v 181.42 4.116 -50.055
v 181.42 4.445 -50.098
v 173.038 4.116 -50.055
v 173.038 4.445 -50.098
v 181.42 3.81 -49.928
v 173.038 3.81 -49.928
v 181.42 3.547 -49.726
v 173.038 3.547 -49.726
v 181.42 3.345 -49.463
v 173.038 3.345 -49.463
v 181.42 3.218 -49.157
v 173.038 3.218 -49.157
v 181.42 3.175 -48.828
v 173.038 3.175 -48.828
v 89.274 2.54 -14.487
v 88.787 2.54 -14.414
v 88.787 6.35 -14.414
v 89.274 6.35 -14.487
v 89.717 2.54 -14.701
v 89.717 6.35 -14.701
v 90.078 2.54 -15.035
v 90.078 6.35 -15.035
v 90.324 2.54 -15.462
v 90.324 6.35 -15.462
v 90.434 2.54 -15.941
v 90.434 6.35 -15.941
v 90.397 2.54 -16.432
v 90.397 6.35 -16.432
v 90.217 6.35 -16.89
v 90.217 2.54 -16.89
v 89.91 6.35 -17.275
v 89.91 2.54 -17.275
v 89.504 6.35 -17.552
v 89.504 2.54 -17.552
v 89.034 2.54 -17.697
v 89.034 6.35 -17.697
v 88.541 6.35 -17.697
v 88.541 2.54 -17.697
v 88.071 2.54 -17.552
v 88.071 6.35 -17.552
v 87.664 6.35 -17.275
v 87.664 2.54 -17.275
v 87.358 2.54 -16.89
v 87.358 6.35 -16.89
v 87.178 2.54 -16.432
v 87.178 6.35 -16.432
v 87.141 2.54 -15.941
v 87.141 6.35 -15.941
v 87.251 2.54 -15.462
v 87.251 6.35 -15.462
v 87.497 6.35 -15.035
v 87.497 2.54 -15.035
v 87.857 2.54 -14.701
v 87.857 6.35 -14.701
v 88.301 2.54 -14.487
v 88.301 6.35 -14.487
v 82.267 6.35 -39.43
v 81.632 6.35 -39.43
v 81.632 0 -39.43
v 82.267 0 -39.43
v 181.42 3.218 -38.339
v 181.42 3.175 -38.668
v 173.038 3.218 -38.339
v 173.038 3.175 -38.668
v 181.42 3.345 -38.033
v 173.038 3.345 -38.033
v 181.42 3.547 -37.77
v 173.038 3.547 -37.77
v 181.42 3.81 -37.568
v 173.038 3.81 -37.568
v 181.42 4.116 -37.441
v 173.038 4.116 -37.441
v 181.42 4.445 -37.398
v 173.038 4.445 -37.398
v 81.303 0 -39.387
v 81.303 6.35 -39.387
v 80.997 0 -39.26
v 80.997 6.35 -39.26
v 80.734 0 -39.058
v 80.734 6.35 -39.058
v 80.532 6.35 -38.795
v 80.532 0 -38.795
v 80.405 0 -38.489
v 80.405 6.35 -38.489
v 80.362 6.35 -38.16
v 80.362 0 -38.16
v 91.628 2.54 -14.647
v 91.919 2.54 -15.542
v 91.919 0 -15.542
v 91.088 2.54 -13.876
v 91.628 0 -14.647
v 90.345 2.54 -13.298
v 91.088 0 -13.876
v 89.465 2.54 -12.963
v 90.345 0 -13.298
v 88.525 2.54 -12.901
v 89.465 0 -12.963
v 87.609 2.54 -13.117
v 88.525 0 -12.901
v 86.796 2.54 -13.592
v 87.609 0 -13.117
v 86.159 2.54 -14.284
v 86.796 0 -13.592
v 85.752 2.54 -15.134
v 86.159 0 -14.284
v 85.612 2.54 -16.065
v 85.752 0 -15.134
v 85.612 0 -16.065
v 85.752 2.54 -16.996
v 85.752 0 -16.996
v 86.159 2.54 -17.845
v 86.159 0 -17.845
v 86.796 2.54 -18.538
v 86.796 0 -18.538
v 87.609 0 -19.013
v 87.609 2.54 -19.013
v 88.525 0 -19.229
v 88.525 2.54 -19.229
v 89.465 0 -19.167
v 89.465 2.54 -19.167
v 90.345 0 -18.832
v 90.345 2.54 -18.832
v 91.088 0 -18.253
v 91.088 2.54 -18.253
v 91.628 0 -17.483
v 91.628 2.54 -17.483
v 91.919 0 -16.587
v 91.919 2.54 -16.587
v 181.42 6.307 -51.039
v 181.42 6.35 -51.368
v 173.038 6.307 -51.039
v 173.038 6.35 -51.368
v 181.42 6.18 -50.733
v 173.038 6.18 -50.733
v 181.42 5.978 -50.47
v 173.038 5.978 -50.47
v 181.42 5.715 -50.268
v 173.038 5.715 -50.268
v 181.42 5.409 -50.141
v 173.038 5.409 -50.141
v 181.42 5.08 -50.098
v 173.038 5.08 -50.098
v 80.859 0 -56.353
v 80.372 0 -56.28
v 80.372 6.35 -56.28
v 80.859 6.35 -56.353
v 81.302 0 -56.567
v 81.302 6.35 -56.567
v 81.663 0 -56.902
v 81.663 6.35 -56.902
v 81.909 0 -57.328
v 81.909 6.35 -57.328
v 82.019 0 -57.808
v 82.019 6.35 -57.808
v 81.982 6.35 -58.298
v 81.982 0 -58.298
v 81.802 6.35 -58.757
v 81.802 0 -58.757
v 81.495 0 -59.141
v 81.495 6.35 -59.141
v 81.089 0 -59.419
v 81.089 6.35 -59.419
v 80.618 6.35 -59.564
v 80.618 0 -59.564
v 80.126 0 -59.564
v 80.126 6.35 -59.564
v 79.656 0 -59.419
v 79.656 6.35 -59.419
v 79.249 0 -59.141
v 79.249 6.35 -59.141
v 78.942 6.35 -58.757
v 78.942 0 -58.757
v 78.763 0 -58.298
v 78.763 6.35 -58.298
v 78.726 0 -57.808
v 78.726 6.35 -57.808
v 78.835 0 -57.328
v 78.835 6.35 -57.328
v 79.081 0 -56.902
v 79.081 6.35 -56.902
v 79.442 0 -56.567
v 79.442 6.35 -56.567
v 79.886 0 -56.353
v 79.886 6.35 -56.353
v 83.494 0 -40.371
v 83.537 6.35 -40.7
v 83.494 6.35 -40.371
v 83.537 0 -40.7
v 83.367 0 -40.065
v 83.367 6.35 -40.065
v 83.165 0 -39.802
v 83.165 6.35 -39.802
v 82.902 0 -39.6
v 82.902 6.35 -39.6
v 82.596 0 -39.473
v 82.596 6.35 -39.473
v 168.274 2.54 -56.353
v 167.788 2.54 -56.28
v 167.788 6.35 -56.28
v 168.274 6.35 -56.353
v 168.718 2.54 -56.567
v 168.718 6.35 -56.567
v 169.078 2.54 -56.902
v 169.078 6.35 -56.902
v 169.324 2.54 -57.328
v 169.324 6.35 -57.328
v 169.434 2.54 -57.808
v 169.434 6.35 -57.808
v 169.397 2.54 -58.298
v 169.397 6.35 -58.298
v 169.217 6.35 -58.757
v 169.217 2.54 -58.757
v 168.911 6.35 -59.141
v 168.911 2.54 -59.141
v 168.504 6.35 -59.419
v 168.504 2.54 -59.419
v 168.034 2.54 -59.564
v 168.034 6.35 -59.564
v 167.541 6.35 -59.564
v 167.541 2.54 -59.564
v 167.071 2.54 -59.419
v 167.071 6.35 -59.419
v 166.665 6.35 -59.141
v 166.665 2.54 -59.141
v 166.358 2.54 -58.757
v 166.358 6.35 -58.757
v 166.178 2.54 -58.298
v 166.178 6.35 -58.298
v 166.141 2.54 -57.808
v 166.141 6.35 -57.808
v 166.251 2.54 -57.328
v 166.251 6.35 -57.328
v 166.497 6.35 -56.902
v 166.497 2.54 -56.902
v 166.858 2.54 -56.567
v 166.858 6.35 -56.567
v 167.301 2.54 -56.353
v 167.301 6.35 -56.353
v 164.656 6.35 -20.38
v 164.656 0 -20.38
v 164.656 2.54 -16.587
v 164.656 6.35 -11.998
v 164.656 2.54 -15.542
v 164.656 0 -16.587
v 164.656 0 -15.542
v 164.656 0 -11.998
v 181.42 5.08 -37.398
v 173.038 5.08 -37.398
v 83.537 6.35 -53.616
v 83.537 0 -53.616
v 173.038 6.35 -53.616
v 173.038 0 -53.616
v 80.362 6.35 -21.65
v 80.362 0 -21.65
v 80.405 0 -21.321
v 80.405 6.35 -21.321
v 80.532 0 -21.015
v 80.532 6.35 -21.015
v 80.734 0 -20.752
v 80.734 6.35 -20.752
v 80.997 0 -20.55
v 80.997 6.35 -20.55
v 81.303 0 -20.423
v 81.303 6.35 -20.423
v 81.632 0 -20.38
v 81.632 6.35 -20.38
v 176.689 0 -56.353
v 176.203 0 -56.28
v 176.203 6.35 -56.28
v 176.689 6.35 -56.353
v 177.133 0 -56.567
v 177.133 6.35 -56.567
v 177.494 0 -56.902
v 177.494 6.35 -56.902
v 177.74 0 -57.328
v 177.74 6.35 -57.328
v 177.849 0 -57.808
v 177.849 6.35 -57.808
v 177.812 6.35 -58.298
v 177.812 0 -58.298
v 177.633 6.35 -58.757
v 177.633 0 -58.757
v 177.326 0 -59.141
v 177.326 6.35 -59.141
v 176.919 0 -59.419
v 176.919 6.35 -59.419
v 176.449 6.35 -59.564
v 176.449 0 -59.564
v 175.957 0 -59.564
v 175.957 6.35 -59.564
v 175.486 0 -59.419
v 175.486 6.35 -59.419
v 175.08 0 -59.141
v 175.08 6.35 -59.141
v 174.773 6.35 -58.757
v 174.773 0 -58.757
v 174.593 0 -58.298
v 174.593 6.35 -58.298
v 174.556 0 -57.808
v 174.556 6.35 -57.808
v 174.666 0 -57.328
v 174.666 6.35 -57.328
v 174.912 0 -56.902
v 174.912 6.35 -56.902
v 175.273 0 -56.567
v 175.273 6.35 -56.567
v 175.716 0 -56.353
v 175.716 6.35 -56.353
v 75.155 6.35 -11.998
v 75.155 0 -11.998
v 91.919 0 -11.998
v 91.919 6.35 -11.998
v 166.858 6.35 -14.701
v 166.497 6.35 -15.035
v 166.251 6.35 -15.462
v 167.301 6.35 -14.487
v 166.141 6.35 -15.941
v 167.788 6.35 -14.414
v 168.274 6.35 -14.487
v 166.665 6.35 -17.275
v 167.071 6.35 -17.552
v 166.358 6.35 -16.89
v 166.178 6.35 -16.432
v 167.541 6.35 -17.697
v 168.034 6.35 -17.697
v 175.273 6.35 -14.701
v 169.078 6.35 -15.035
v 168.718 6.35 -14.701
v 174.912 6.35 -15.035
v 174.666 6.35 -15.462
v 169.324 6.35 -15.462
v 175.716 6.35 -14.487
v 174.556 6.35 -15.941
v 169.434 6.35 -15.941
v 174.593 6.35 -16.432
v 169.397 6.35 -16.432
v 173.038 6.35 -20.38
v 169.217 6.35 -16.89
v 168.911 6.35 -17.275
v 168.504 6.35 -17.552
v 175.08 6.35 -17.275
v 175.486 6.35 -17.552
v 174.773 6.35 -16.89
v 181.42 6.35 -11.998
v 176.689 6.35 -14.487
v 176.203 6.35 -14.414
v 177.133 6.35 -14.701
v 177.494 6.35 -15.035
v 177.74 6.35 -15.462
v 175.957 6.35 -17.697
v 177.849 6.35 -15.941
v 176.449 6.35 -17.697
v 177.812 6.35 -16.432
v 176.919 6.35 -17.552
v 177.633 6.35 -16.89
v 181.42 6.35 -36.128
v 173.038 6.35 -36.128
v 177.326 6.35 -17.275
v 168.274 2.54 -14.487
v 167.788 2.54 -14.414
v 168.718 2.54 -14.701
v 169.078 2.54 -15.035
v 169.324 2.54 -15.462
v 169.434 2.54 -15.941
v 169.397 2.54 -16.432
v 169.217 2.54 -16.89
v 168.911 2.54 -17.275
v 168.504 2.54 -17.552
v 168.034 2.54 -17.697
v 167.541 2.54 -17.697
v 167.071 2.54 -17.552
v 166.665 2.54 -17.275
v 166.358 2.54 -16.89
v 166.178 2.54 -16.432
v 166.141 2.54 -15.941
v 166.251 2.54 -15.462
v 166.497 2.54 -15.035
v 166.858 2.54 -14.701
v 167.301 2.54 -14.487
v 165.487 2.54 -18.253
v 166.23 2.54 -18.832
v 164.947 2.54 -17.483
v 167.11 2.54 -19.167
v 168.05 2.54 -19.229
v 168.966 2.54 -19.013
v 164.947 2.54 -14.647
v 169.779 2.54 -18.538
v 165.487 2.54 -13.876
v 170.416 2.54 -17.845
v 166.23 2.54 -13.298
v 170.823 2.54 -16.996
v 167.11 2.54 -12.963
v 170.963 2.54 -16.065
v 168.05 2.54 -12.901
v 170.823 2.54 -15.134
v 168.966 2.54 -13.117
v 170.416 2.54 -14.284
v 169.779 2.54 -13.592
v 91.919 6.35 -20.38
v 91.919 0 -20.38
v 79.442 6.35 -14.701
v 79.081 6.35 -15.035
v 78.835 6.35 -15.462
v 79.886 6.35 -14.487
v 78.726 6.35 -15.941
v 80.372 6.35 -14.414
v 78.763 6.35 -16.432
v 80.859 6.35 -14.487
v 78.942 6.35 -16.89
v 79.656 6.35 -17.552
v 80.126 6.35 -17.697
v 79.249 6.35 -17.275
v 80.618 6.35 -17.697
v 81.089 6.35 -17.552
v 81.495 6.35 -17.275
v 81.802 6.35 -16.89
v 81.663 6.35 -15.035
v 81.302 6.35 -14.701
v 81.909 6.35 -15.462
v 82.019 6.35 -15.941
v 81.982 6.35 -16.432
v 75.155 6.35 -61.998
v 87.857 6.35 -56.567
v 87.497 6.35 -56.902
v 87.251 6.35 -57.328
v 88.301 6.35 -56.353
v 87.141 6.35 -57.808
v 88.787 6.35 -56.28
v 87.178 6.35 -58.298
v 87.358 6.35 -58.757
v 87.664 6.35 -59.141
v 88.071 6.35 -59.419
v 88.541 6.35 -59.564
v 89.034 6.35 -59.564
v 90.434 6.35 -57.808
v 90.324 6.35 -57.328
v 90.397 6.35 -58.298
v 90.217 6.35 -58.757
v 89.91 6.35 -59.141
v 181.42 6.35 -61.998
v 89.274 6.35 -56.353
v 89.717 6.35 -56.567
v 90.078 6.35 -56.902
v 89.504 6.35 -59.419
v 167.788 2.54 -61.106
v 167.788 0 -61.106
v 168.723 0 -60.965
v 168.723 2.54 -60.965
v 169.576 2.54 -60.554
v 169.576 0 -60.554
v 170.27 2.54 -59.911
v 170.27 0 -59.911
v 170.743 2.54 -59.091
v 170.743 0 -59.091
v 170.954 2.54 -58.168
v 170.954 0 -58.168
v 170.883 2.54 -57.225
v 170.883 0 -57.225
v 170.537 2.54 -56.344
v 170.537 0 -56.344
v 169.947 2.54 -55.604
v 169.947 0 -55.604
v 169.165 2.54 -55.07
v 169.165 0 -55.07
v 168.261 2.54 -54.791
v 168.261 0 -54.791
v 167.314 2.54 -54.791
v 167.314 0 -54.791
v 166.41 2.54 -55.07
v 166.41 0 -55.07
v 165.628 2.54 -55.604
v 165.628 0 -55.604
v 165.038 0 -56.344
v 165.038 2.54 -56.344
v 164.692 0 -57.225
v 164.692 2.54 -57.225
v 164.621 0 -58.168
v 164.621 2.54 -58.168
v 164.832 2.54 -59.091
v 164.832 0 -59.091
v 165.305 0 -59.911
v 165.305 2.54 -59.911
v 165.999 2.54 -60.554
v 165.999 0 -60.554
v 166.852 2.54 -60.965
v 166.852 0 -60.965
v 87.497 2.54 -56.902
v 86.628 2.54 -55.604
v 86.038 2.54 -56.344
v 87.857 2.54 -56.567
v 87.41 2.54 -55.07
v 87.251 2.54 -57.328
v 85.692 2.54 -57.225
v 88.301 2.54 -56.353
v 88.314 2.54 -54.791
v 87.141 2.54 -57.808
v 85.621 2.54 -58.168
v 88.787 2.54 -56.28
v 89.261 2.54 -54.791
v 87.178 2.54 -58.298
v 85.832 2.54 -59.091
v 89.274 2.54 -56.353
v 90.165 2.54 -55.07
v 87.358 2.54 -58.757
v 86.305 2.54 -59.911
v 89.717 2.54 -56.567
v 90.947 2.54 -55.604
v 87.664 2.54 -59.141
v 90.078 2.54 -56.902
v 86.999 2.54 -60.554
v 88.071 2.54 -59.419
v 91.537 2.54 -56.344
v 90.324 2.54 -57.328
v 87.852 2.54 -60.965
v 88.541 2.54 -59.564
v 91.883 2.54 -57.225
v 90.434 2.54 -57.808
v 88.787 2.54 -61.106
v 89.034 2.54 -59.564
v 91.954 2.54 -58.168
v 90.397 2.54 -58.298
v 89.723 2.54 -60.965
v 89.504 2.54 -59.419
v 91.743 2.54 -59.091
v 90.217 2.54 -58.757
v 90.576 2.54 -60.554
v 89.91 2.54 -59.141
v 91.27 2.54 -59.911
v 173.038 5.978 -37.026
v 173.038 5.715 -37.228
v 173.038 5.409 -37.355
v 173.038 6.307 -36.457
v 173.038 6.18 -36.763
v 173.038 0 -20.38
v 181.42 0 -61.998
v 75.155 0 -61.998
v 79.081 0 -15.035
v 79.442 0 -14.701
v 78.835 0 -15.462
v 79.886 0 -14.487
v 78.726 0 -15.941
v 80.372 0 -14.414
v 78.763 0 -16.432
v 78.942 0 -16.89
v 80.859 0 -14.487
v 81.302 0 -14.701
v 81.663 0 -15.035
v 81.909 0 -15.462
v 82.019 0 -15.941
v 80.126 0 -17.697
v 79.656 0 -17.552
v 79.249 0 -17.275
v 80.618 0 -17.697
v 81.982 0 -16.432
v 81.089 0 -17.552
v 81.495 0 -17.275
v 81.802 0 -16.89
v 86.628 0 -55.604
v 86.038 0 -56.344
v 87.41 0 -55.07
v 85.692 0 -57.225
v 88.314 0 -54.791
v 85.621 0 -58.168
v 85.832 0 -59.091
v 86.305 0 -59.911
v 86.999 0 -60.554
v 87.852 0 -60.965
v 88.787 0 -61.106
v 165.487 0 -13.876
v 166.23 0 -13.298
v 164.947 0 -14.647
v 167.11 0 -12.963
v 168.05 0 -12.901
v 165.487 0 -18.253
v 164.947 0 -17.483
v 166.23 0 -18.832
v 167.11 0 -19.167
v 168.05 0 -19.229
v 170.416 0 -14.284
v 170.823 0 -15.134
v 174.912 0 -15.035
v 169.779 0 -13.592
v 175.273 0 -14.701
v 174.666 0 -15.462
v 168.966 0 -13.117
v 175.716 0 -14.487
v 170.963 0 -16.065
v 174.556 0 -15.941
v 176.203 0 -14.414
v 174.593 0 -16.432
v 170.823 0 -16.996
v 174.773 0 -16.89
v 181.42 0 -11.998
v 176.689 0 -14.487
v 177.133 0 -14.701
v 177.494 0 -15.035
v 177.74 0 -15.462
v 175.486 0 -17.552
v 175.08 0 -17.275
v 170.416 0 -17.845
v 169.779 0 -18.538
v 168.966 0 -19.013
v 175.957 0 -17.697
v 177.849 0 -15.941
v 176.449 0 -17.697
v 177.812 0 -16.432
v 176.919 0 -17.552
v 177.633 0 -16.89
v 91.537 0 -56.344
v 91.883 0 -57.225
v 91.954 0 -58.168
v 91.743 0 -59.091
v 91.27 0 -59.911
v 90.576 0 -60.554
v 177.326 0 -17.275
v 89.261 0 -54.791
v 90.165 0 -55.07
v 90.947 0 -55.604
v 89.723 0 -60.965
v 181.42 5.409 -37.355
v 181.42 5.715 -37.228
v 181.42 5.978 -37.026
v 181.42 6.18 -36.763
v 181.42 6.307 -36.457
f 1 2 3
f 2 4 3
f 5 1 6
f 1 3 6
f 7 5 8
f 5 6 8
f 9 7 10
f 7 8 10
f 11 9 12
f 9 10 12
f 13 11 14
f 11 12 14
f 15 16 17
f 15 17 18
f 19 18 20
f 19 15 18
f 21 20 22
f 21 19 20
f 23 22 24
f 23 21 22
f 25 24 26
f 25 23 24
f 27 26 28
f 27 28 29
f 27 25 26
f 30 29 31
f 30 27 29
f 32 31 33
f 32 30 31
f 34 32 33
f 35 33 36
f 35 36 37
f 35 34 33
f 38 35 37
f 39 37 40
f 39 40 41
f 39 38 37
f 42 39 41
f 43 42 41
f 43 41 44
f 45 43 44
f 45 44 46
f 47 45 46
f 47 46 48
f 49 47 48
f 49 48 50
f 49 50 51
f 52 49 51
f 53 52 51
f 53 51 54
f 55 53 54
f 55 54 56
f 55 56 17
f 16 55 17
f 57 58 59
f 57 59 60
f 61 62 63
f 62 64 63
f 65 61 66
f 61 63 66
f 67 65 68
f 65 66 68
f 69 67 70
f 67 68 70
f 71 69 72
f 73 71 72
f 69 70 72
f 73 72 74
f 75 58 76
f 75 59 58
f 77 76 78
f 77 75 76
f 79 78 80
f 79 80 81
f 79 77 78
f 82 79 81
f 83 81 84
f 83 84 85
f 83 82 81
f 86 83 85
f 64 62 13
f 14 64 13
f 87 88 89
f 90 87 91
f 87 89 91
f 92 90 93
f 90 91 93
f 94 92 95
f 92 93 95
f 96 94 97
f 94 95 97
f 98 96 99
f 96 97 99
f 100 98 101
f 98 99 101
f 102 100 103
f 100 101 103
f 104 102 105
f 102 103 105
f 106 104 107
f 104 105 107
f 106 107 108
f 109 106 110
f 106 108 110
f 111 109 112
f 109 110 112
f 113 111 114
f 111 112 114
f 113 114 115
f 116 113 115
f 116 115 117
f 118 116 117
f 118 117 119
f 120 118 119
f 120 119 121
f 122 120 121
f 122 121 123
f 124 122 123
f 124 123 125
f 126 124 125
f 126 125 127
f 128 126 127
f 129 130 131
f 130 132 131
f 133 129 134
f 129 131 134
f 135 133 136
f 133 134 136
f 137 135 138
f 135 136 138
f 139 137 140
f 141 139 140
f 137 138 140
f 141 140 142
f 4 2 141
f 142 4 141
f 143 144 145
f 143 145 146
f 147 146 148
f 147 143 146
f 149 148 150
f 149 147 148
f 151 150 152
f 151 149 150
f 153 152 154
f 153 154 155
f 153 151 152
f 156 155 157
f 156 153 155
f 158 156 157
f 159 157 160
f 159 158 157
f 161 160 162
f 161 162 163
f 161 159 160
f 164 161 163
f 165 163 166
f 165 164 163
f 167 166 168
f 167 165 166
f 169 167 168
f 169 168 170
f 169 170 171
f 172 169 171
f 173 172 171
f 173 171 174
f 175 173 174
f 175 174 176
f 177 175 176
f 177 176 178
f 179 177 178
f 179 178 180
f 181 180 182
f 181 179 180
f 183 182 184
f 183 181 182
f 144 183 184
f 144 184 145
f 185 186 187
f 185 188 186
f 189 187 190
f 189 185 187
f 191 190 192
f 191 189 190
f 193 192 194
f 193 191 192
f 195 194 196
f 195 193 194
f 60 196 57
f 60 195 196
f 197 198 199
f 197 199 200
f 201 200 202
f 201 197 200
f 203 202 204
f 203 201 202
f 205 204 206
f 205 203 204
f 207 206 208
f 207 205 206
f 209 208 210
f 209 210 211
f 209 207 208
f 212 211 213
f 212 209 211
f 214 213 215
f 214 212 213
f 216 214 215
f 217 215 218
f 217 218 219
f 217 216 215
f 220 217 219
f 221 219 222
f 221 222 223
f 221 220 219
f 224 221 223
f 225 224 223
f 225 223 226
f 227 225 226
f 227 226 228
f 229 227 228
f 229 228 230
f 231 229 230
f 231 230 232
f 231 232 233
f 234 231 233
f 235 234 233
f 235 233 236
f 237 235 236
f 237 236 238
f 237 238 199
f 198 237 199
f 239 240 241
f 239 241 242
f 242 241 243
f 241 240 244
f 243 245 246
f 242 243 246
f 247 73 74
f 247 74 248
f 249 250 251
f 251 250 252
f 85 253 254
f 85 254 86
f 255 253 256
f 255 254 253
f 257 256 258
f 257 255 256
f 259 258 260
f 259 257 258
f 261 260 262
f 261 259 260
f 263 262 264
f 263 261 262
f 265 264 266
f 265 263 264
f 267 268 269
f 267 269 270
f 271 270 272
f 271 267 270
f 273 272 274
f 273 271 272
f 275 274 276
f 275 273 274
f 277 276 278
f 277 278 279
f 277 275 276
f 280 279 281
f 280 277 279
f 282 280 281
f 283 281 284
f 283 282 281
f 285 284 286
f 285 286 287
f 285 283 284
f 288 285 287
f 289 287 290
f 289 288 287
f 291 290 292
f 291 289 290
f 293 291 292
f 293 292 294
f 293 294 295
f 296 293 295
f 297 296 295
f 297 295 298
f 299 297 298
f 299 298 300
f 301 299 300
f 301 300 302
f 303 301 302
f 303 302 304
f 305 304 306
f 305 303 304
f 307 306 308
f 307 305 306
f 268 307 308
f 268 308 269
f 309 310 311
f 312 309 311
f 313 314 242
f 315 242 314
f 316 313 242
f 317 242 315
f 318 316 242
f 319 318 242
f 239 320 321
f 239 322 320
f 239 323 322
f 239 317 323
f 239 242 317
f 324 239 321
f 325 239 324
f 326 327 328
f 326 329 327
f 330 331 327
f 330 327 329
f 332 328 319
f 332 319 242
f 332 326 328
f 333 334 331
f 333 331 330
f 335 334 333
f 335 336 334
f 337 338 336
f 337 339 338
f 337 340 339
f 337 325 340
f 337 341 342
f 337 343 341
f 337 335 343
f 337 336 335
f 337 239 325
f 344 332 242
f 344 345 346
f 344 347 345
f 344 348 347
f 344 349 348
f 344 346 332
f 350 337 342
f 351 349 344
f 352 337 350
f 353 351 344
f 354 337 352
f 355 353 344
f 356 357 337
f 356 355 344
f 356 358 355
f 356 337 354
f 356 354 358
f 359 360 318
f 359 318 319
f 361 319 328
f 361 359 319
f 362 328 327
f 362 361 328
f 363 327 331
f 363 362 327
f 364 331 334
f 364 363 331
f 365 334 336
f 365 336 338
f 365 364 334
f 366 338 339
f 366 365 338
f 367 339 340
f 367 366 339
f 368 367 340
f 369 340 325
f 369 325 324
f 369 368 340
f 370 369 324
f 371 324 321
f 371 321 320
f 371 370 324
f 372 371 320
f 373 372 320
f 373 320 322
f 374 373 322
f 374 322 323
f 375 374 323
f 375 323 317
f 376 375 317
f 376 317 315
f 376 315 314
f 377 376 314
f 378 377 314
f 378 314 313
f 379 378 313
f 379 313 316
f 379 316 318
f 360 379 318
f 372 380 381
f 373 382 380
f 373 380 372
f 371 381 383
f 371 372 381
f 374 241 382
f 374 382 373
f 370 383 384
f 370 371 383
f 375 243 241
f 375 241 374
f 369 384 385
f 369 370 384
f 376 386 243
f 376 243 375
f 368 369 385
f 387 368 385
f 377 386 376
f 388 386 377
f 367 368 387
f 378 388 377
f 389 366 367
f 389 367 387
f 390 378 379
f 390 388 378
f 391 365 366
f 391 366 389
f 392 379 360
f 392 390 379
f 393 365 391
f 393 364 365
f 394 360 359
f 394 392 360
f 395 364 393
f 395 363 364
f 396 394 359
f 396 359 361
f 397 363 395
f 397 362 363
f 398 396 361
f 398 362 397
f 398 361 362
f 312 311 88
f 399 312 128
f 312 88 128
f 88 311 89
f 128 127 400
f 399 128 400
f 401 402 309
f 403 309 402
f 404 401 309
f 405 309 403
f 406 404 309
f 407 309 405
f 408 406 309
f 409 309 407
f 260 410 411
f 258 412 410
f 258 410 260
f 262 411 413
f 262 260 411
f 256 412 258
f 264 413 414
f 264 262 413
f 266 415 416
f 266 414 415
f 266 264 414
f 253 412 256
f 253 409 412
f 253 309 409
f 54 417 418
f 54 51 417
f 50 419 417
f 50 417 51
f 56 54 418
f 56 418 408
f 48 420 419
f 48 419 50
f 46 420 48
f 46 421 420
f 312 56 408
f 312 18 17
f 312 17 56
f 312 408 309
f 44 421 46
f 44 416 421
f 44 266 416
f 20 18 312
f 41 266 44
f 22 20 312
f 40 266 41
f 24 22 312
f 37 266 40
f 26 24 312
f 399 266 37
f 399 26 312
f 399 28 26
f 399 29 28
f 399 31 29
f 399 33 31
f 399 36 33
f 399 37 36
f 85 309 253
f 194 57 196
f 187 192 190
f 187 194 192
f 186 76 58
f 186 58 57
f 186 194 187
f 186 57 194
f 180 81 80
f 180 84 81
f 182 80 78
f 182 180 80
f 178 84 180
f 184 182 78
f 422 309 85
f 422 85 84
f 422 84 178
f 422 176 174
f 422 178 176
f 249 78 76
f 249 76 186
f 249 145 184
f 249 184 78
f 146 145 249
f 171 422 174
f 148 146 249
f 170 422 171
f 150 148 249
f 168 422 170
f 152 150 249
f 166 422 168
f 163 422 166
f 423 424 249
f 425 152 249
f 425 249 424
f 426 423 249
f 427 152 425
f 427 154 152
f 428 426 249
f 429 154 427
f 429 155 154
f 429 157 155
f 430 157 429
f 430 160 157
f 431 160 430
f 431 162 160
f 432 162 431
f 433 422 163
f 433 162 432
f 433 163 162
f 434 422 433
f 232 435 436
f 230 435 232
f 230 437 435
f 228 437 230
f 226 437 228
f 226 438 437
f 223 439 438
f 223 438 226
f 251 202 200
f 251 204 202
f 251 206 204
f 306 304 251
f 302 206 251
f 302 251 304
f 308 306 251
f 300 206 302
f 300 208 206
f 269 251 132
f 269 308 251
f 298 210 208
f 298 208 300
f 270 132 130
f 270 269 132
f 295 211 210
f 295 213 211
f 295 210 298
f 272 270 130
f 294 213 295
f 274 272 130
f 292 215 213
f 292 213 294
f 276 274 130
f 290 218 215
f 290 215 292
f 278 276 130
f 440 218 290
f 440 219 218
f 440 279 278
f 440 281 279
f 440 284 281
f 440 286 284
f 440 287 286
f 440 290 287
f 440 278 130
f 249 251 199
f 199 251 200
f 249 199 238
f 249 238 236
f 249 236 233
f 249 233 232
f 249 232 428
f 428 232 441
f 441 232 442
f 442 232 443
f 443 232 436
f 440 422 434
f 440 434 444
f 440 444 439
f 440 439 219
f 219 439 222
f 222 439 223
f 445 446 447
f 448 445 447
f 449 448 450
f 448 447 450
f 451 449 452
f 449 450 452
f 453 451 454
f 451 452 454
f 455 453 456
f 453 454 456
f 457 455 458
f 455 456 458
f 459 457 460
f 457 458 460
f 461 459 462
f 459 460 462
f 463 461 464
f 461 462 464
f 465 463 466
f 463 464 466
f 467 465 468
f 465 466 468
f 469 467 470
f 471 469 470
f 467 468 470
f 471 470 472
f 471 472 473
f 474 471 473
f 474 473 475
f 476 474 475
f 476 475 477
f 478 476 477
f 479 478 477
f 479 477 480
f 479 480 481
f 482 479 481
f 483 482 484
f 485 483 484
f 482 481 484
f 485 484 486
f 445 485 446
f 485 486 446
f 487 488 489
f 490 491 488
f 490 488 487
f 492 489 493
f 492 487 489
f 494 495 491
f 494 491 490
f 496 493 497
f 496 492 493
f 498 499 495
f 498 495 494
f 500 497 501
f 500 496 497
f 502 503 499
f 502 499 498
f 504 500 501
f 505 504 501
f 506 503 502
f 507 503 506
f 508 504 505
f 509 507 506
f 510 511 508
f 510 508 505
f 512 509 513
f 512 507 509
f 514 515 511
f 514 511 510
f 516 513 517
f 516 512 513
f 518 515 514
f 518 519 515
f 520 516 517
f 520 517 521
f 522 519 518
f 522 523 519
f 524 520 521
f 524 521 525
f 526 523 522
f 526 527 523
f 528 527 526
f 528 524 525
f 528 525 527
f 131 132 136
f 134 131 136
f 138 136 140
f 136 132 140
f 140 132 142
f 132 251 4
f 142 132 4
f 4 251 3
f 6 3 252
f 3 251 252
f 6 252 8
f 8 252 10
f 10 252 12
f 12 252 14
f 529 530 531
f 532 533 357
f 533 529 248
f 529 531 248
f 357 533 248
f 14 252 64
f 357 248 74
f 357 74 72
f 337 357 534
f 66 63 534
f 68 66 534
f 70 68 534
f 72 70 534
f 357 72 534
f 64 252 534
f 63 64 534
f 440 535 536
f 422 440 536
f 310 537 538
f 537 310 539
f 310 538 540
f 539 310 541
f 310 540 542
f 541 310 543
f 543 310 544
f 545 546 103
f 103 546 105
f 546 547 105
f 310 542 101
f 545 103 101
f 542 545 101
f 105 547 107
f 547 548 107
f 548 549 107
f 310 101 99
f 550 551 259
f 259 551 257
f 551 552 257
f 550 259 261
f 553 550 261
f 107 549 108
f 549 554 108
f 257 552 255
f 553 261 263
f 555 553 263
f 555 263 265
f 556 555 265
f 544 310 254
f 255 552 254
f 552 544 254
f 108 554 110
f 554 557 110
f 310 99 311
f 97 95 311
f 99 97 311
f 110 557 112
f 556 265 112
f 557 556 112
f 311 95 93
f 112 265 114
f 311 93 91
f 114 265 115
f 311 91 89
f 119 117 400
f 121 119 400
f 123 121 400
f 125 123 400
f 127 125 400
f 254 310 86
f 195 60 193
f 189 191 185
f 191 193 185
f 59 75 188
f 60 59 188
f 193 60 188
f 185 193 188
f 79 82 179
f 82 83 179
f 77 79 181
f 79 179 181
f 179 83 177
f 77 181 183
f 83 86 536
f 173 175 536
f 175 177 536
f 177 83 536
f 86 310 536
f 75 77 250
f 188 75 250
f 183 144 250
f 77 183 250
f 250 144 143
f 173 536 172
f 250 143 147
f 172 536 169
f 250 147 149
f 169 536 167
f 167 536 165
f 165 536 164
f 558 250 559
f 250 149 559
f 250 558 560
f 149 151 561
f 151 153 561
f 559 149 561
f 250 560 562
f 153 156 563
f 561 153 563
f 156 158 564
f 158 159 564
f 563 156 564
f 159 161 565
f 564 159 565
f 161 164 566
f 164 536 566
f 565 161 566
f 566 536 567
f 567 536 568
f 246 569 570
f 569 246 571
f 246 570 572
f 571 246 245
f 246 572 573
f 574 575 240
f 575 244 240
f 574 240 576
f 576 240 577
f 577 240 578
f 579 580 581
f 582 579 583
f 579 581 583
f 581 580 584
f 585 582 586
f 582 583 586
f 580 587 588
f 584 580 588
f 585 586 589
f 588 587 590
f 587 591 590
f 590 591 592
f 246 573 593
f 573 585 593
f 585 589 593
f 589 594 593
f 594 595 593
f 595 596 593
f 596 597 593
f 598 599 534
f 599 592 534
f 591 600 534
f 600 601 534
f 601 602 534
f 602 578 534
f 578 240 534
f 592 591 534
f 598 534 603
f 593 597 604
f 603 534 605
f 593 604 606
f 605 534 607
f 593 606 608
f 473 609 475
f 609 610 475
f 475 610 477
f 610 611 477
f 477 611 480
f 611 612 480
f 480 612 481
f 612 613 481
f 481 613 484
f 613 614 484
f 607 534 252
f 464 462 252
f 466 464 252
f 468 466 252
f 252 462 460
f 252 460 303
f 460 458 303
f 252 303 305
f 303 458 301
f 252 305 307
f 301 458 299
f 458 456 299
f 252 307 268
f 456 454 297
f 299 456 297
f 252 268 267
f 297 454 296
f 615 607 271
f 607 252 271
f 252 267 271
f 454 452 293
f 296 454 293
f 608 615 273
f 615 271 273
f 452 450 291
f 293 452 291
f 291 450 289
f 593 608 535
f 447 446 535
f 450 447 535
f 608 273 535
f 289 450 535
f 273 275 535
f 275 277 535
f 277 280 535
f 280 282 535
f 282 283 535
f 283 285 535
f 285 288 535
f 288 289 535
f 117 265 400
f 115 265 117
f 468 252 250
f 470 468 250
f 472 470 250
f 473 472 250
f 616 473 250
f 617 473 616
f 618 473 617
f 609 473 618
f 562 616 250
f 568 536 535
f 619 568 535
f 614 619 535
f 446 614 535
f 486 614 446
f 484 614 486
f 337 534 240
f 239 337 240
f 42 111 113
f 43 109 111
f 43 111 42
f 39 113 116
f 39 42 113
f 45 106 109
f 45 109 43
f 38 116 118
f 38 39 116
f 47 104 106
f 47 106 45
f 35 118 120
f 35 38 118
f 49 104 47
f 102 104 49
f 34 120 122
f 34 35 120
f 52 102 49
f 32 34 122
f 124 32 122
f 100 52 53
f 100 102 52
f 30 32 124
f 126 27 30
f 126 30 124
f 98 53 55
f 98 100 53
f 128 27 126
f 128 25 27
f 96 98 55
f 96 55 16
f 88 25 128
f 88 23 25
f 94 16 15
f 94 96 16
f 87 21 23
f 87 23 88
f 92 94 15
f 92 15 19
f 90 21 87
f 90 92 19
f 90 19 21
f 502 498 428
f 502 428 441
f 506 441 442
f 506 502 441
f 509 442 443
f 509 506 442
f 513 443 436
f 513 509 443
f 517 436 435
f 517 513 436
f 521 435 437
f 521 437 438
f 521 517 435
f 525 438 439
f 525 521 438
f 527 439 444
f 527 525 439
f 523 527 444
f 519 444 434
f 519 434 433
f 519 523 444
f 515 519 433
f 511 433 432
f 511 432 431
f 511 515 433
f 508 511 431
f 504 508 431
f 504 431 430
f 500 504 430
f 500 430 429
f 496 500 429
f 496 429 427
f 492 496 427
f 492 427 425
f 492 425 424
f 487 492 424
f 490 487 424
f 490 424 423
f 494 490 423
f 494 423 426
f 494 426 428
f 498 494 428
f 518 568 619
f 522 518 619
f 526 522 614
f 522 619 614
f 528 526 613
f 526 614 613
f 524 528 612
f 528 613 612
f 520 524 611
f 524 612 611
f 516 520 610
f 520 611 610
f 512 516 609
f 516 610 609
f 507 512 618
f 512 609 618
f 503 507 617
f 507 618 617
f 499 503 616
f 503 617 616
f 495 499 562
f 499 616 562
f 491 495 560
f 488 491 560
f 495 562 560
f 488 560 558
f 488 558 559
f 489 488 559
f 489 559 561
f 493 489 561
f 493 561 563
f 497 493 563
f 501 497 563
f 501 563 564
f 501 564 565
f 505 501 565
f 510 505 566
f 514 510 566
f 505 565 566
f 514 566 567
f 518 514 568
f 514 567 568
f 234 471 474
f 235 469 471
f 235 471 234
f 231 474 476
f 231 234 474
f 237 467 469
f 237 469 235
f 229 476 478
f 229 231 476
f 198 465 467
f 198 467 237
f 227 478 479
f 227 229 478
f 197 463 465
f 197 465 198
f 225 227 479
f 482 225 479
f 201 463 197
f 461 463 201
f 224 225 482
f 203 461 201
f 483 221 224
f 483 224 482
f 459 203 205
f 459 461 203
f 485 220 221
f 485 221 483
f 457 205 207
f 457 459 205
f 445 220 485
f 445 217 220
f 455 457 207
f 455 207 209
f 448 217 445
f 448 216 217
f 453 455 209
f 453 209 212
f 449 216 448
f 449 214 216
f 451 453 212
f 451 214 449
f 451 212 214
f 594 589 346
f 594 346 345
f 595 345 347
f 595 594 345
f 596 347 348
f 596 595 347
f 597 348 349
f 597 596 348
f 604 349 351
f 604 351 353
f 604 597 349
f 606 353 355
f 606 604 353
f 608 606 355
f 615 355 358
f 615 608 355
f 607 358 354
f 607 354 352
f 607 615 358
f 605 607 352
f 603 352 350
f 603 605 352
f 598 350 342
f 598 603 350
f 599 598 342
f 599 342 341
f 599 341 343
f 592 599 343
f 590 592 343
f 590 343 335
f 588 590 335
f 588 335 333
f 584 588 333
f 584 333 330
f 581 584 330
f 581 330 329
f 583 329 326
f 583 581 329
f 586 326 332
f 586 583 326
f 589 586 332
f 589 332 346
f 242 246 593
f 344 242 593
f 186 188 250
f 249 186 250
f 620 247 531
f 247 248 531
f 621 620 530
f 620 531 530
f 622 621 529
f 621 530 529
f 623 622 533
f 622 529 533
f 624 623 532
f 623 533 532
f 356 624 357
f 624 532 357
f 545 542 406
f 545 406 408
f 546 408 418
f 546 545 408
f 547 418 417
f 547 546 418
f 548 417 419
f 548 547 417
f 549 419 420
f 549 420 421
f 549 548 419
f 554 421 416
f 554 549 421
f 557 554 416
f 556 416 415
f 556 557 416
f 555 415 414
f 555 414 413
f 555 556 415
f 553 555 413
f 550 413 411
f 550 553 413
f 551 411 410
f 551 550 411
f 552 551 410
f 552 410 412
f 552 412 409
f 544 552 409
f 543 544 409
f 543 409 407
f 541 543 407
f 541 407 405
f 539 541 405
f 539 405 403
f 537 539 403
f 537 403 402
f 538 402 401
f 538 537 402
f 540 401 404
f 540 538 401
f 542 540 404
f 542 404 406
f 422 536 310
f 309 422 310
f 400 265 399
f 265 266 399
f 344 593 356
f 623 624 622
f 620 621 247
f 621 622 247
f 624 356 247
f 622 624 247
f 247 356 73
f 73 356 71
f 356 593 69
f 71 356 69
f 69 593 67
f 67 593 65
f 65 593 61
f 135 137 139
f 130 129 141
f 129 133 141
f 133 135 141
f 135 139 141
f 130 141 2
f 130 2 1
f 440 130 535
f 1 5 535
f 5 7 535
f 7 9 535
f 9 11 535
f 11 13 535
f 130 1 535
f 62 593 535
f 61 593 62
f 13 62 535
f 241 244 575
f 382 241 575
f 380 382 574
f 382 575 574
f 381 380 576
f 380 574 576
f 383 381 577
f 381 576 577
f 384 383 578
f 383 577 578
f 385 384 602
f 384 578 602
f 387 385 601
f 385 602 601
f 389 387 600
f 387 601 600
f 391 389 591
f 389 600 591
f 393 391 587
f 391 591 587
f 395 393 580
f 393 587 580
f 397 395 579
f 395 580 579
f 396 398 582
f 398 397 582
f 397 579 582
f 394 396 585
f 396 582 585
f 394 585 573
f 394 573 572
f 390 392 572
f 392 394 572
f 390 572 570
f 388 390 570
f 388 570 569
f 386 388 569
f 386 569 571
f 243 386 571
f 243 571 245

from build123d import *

# Parameters (mm, degrees)
SKETCH1_R           = 1.651
BOSS_EXTRUDE1_DEPTH = 6.35
SKETCH2_W           = 12.7
SKETCH2_H           = 3.175
CUT_EXTRUDE7_DEPTH  = 8.89
FILLET2_R           = 1.27
SKETCH4_W           = 3.175
SKETCH4_H           = 19.05
CUT_EXTRUDE8_DEPTH  = 192.82600491
FILLET3_R           = 1.27
SKETCH5_R           = 3.175
CUT_EXTRUDE9_DEPTH  = 2.54


with BuildPart() as part:
    # Sketch1 → Boss-Extrude1 (new body)
    with BuildSketch(Plane(origin=(0, 0, 0), x_dir=(1, 0, 0), z_dir=(0, 1, 0))):
        Polygon((75.155177047, 61.997896552), (75.155177047, 11.997896552), (91.919177047, 11.997896552), (91.919177047, 20.379896552), (83.537177047, 20.379896552), (83.537177047, 53.615896552), (173.037829354, 53.615896552), (173.037829354, 20.379896552), (164.655829354, 20.379896552), (164.655829354, 11.997896552), (181.419829354, 11.997896552), (181.419829354, 61.997896552), align=None)
        with Locations(Location((80.3721812, 16.064784874, 0), (0, 0, 270))):
            Circle(SKETCH1_R, mode=Mode.SUBTRACT)
        with Locations(Location((80.3721812, 57.93100823, 0), (0, 0, 270))):
            Circle(SKETCH1_R, mode=Mode.SUBTRACT)
        with Locations(Location((88.7874552, 16.064784874, 0), (0, 0, 270))):
            Circle(SKETCH1_R, mode=Mode.SUBTRACT)
        with Locations(Location((167.7875512, 57.93100823, 0), (0, 0, 270))):
            Circle(SKETCH1_R, mode=Mode.SUBTRACT)
        with Locations(Location((88.7874552, 57.93100823, 0), (0, 0, 270))):
            Circle(SKETCH1_R, mode=Mode.SUBTRACT)
        with Locations(Location((176.2028252, 57.93100823, 0), (0, 0, 270))):
            Circle(SKETCH1_R, mode=Mode.SUBTRACT)
        with Locations(Location((176.2028252, 16.064784874, 0), (0, 0, 270))):
            Circle(SKETCH1_R, mode=Mode.SUBTRACT)
        with Locations(Location((167.7875512, 16.064784874, 0), (0, 0, 270))):
            Circle(SKETCH1_R, mode=Mode.SUBTRACT)
    extrude(amount=BOSS_EXTRUDE1_DEPTH)

    # Sketch2 → Cut-Extrude7 (cut)
    with BuildSketch(Plane(origin=(181.419829354, 0, 0), x_dir=(0, 0, -1), z_dir=(1, 0, 0))):
        with Locations((43.747896552, 4.7625)):
            Rectangle(SKETCH2_W, SKETCH2_H)
    extrude(amount=-CUT_EXTRUDE7_DEPTH, mode=Mode.SUBTRACT)

    # Fillet2
    fillet2_edges = [part.edges().sort_by_distance(p)[0] for p in [
        (177.228829354, 6.35, -37.397896552),
        (177.228829354, 6.35, -50.097896552),
        (177.228829354, 3.175, -50.097896552),
        (177.228829354, 3.175, -37.397896552),
    ]]
    fillet(fillet2_edges, radius=FILLET2_R)

    # Sketch4 → Cut-Extrude8 (cut, through all)
    with BuildSketch(Plane(origin=(0, 6.35, 0), x_dir=(1, 0, 0), z_dir=(0, 1, 0))):
        with Locations((81.949677047, 29.904896552)):
            Rectangle(SKETCH4_W, SKETCH4_H)
    extrude(amount=-CUT_EXTRUDE8_DEPTH, mode=Mode.SUBTRACT)

    # Fillet3
    fillet3_edges = [part.edges().sort_by_distance(p)[0] for p in [
        (83.537177047, 3.175, -39.429896552),
        (80.362177047, 3.175, -20.379896552),
        (80.362177047, 3.175, -39.429896552),
    ]]
    fillet(fillet3_edges, radius=FILLET3_R)

    # Sketch5 → Cut-Extrude9 (cut)
    with BuildSketch(Plane.XZ):
        with Locations((88.7874552, -16.064784874)):
            Circle(SKETCH5_R)
        with Locations(Location((88.7874552, -57.93100823, 0), (0, 0, 270))):
            Circle(SKETCH5_R)
        with Locations(Location((167.7875512, -57.93100823, 0), (0, 0, 270))):
            Circle(SKETCH5_R)
        with Locations((167.7875512, -16.064784874)):
            Circle(SKETCH5_R)
    extrude(amount=-CUT_EXTRUDE9_DEPTH, mode=Mode.SUBTRACT)


solid = part.part
